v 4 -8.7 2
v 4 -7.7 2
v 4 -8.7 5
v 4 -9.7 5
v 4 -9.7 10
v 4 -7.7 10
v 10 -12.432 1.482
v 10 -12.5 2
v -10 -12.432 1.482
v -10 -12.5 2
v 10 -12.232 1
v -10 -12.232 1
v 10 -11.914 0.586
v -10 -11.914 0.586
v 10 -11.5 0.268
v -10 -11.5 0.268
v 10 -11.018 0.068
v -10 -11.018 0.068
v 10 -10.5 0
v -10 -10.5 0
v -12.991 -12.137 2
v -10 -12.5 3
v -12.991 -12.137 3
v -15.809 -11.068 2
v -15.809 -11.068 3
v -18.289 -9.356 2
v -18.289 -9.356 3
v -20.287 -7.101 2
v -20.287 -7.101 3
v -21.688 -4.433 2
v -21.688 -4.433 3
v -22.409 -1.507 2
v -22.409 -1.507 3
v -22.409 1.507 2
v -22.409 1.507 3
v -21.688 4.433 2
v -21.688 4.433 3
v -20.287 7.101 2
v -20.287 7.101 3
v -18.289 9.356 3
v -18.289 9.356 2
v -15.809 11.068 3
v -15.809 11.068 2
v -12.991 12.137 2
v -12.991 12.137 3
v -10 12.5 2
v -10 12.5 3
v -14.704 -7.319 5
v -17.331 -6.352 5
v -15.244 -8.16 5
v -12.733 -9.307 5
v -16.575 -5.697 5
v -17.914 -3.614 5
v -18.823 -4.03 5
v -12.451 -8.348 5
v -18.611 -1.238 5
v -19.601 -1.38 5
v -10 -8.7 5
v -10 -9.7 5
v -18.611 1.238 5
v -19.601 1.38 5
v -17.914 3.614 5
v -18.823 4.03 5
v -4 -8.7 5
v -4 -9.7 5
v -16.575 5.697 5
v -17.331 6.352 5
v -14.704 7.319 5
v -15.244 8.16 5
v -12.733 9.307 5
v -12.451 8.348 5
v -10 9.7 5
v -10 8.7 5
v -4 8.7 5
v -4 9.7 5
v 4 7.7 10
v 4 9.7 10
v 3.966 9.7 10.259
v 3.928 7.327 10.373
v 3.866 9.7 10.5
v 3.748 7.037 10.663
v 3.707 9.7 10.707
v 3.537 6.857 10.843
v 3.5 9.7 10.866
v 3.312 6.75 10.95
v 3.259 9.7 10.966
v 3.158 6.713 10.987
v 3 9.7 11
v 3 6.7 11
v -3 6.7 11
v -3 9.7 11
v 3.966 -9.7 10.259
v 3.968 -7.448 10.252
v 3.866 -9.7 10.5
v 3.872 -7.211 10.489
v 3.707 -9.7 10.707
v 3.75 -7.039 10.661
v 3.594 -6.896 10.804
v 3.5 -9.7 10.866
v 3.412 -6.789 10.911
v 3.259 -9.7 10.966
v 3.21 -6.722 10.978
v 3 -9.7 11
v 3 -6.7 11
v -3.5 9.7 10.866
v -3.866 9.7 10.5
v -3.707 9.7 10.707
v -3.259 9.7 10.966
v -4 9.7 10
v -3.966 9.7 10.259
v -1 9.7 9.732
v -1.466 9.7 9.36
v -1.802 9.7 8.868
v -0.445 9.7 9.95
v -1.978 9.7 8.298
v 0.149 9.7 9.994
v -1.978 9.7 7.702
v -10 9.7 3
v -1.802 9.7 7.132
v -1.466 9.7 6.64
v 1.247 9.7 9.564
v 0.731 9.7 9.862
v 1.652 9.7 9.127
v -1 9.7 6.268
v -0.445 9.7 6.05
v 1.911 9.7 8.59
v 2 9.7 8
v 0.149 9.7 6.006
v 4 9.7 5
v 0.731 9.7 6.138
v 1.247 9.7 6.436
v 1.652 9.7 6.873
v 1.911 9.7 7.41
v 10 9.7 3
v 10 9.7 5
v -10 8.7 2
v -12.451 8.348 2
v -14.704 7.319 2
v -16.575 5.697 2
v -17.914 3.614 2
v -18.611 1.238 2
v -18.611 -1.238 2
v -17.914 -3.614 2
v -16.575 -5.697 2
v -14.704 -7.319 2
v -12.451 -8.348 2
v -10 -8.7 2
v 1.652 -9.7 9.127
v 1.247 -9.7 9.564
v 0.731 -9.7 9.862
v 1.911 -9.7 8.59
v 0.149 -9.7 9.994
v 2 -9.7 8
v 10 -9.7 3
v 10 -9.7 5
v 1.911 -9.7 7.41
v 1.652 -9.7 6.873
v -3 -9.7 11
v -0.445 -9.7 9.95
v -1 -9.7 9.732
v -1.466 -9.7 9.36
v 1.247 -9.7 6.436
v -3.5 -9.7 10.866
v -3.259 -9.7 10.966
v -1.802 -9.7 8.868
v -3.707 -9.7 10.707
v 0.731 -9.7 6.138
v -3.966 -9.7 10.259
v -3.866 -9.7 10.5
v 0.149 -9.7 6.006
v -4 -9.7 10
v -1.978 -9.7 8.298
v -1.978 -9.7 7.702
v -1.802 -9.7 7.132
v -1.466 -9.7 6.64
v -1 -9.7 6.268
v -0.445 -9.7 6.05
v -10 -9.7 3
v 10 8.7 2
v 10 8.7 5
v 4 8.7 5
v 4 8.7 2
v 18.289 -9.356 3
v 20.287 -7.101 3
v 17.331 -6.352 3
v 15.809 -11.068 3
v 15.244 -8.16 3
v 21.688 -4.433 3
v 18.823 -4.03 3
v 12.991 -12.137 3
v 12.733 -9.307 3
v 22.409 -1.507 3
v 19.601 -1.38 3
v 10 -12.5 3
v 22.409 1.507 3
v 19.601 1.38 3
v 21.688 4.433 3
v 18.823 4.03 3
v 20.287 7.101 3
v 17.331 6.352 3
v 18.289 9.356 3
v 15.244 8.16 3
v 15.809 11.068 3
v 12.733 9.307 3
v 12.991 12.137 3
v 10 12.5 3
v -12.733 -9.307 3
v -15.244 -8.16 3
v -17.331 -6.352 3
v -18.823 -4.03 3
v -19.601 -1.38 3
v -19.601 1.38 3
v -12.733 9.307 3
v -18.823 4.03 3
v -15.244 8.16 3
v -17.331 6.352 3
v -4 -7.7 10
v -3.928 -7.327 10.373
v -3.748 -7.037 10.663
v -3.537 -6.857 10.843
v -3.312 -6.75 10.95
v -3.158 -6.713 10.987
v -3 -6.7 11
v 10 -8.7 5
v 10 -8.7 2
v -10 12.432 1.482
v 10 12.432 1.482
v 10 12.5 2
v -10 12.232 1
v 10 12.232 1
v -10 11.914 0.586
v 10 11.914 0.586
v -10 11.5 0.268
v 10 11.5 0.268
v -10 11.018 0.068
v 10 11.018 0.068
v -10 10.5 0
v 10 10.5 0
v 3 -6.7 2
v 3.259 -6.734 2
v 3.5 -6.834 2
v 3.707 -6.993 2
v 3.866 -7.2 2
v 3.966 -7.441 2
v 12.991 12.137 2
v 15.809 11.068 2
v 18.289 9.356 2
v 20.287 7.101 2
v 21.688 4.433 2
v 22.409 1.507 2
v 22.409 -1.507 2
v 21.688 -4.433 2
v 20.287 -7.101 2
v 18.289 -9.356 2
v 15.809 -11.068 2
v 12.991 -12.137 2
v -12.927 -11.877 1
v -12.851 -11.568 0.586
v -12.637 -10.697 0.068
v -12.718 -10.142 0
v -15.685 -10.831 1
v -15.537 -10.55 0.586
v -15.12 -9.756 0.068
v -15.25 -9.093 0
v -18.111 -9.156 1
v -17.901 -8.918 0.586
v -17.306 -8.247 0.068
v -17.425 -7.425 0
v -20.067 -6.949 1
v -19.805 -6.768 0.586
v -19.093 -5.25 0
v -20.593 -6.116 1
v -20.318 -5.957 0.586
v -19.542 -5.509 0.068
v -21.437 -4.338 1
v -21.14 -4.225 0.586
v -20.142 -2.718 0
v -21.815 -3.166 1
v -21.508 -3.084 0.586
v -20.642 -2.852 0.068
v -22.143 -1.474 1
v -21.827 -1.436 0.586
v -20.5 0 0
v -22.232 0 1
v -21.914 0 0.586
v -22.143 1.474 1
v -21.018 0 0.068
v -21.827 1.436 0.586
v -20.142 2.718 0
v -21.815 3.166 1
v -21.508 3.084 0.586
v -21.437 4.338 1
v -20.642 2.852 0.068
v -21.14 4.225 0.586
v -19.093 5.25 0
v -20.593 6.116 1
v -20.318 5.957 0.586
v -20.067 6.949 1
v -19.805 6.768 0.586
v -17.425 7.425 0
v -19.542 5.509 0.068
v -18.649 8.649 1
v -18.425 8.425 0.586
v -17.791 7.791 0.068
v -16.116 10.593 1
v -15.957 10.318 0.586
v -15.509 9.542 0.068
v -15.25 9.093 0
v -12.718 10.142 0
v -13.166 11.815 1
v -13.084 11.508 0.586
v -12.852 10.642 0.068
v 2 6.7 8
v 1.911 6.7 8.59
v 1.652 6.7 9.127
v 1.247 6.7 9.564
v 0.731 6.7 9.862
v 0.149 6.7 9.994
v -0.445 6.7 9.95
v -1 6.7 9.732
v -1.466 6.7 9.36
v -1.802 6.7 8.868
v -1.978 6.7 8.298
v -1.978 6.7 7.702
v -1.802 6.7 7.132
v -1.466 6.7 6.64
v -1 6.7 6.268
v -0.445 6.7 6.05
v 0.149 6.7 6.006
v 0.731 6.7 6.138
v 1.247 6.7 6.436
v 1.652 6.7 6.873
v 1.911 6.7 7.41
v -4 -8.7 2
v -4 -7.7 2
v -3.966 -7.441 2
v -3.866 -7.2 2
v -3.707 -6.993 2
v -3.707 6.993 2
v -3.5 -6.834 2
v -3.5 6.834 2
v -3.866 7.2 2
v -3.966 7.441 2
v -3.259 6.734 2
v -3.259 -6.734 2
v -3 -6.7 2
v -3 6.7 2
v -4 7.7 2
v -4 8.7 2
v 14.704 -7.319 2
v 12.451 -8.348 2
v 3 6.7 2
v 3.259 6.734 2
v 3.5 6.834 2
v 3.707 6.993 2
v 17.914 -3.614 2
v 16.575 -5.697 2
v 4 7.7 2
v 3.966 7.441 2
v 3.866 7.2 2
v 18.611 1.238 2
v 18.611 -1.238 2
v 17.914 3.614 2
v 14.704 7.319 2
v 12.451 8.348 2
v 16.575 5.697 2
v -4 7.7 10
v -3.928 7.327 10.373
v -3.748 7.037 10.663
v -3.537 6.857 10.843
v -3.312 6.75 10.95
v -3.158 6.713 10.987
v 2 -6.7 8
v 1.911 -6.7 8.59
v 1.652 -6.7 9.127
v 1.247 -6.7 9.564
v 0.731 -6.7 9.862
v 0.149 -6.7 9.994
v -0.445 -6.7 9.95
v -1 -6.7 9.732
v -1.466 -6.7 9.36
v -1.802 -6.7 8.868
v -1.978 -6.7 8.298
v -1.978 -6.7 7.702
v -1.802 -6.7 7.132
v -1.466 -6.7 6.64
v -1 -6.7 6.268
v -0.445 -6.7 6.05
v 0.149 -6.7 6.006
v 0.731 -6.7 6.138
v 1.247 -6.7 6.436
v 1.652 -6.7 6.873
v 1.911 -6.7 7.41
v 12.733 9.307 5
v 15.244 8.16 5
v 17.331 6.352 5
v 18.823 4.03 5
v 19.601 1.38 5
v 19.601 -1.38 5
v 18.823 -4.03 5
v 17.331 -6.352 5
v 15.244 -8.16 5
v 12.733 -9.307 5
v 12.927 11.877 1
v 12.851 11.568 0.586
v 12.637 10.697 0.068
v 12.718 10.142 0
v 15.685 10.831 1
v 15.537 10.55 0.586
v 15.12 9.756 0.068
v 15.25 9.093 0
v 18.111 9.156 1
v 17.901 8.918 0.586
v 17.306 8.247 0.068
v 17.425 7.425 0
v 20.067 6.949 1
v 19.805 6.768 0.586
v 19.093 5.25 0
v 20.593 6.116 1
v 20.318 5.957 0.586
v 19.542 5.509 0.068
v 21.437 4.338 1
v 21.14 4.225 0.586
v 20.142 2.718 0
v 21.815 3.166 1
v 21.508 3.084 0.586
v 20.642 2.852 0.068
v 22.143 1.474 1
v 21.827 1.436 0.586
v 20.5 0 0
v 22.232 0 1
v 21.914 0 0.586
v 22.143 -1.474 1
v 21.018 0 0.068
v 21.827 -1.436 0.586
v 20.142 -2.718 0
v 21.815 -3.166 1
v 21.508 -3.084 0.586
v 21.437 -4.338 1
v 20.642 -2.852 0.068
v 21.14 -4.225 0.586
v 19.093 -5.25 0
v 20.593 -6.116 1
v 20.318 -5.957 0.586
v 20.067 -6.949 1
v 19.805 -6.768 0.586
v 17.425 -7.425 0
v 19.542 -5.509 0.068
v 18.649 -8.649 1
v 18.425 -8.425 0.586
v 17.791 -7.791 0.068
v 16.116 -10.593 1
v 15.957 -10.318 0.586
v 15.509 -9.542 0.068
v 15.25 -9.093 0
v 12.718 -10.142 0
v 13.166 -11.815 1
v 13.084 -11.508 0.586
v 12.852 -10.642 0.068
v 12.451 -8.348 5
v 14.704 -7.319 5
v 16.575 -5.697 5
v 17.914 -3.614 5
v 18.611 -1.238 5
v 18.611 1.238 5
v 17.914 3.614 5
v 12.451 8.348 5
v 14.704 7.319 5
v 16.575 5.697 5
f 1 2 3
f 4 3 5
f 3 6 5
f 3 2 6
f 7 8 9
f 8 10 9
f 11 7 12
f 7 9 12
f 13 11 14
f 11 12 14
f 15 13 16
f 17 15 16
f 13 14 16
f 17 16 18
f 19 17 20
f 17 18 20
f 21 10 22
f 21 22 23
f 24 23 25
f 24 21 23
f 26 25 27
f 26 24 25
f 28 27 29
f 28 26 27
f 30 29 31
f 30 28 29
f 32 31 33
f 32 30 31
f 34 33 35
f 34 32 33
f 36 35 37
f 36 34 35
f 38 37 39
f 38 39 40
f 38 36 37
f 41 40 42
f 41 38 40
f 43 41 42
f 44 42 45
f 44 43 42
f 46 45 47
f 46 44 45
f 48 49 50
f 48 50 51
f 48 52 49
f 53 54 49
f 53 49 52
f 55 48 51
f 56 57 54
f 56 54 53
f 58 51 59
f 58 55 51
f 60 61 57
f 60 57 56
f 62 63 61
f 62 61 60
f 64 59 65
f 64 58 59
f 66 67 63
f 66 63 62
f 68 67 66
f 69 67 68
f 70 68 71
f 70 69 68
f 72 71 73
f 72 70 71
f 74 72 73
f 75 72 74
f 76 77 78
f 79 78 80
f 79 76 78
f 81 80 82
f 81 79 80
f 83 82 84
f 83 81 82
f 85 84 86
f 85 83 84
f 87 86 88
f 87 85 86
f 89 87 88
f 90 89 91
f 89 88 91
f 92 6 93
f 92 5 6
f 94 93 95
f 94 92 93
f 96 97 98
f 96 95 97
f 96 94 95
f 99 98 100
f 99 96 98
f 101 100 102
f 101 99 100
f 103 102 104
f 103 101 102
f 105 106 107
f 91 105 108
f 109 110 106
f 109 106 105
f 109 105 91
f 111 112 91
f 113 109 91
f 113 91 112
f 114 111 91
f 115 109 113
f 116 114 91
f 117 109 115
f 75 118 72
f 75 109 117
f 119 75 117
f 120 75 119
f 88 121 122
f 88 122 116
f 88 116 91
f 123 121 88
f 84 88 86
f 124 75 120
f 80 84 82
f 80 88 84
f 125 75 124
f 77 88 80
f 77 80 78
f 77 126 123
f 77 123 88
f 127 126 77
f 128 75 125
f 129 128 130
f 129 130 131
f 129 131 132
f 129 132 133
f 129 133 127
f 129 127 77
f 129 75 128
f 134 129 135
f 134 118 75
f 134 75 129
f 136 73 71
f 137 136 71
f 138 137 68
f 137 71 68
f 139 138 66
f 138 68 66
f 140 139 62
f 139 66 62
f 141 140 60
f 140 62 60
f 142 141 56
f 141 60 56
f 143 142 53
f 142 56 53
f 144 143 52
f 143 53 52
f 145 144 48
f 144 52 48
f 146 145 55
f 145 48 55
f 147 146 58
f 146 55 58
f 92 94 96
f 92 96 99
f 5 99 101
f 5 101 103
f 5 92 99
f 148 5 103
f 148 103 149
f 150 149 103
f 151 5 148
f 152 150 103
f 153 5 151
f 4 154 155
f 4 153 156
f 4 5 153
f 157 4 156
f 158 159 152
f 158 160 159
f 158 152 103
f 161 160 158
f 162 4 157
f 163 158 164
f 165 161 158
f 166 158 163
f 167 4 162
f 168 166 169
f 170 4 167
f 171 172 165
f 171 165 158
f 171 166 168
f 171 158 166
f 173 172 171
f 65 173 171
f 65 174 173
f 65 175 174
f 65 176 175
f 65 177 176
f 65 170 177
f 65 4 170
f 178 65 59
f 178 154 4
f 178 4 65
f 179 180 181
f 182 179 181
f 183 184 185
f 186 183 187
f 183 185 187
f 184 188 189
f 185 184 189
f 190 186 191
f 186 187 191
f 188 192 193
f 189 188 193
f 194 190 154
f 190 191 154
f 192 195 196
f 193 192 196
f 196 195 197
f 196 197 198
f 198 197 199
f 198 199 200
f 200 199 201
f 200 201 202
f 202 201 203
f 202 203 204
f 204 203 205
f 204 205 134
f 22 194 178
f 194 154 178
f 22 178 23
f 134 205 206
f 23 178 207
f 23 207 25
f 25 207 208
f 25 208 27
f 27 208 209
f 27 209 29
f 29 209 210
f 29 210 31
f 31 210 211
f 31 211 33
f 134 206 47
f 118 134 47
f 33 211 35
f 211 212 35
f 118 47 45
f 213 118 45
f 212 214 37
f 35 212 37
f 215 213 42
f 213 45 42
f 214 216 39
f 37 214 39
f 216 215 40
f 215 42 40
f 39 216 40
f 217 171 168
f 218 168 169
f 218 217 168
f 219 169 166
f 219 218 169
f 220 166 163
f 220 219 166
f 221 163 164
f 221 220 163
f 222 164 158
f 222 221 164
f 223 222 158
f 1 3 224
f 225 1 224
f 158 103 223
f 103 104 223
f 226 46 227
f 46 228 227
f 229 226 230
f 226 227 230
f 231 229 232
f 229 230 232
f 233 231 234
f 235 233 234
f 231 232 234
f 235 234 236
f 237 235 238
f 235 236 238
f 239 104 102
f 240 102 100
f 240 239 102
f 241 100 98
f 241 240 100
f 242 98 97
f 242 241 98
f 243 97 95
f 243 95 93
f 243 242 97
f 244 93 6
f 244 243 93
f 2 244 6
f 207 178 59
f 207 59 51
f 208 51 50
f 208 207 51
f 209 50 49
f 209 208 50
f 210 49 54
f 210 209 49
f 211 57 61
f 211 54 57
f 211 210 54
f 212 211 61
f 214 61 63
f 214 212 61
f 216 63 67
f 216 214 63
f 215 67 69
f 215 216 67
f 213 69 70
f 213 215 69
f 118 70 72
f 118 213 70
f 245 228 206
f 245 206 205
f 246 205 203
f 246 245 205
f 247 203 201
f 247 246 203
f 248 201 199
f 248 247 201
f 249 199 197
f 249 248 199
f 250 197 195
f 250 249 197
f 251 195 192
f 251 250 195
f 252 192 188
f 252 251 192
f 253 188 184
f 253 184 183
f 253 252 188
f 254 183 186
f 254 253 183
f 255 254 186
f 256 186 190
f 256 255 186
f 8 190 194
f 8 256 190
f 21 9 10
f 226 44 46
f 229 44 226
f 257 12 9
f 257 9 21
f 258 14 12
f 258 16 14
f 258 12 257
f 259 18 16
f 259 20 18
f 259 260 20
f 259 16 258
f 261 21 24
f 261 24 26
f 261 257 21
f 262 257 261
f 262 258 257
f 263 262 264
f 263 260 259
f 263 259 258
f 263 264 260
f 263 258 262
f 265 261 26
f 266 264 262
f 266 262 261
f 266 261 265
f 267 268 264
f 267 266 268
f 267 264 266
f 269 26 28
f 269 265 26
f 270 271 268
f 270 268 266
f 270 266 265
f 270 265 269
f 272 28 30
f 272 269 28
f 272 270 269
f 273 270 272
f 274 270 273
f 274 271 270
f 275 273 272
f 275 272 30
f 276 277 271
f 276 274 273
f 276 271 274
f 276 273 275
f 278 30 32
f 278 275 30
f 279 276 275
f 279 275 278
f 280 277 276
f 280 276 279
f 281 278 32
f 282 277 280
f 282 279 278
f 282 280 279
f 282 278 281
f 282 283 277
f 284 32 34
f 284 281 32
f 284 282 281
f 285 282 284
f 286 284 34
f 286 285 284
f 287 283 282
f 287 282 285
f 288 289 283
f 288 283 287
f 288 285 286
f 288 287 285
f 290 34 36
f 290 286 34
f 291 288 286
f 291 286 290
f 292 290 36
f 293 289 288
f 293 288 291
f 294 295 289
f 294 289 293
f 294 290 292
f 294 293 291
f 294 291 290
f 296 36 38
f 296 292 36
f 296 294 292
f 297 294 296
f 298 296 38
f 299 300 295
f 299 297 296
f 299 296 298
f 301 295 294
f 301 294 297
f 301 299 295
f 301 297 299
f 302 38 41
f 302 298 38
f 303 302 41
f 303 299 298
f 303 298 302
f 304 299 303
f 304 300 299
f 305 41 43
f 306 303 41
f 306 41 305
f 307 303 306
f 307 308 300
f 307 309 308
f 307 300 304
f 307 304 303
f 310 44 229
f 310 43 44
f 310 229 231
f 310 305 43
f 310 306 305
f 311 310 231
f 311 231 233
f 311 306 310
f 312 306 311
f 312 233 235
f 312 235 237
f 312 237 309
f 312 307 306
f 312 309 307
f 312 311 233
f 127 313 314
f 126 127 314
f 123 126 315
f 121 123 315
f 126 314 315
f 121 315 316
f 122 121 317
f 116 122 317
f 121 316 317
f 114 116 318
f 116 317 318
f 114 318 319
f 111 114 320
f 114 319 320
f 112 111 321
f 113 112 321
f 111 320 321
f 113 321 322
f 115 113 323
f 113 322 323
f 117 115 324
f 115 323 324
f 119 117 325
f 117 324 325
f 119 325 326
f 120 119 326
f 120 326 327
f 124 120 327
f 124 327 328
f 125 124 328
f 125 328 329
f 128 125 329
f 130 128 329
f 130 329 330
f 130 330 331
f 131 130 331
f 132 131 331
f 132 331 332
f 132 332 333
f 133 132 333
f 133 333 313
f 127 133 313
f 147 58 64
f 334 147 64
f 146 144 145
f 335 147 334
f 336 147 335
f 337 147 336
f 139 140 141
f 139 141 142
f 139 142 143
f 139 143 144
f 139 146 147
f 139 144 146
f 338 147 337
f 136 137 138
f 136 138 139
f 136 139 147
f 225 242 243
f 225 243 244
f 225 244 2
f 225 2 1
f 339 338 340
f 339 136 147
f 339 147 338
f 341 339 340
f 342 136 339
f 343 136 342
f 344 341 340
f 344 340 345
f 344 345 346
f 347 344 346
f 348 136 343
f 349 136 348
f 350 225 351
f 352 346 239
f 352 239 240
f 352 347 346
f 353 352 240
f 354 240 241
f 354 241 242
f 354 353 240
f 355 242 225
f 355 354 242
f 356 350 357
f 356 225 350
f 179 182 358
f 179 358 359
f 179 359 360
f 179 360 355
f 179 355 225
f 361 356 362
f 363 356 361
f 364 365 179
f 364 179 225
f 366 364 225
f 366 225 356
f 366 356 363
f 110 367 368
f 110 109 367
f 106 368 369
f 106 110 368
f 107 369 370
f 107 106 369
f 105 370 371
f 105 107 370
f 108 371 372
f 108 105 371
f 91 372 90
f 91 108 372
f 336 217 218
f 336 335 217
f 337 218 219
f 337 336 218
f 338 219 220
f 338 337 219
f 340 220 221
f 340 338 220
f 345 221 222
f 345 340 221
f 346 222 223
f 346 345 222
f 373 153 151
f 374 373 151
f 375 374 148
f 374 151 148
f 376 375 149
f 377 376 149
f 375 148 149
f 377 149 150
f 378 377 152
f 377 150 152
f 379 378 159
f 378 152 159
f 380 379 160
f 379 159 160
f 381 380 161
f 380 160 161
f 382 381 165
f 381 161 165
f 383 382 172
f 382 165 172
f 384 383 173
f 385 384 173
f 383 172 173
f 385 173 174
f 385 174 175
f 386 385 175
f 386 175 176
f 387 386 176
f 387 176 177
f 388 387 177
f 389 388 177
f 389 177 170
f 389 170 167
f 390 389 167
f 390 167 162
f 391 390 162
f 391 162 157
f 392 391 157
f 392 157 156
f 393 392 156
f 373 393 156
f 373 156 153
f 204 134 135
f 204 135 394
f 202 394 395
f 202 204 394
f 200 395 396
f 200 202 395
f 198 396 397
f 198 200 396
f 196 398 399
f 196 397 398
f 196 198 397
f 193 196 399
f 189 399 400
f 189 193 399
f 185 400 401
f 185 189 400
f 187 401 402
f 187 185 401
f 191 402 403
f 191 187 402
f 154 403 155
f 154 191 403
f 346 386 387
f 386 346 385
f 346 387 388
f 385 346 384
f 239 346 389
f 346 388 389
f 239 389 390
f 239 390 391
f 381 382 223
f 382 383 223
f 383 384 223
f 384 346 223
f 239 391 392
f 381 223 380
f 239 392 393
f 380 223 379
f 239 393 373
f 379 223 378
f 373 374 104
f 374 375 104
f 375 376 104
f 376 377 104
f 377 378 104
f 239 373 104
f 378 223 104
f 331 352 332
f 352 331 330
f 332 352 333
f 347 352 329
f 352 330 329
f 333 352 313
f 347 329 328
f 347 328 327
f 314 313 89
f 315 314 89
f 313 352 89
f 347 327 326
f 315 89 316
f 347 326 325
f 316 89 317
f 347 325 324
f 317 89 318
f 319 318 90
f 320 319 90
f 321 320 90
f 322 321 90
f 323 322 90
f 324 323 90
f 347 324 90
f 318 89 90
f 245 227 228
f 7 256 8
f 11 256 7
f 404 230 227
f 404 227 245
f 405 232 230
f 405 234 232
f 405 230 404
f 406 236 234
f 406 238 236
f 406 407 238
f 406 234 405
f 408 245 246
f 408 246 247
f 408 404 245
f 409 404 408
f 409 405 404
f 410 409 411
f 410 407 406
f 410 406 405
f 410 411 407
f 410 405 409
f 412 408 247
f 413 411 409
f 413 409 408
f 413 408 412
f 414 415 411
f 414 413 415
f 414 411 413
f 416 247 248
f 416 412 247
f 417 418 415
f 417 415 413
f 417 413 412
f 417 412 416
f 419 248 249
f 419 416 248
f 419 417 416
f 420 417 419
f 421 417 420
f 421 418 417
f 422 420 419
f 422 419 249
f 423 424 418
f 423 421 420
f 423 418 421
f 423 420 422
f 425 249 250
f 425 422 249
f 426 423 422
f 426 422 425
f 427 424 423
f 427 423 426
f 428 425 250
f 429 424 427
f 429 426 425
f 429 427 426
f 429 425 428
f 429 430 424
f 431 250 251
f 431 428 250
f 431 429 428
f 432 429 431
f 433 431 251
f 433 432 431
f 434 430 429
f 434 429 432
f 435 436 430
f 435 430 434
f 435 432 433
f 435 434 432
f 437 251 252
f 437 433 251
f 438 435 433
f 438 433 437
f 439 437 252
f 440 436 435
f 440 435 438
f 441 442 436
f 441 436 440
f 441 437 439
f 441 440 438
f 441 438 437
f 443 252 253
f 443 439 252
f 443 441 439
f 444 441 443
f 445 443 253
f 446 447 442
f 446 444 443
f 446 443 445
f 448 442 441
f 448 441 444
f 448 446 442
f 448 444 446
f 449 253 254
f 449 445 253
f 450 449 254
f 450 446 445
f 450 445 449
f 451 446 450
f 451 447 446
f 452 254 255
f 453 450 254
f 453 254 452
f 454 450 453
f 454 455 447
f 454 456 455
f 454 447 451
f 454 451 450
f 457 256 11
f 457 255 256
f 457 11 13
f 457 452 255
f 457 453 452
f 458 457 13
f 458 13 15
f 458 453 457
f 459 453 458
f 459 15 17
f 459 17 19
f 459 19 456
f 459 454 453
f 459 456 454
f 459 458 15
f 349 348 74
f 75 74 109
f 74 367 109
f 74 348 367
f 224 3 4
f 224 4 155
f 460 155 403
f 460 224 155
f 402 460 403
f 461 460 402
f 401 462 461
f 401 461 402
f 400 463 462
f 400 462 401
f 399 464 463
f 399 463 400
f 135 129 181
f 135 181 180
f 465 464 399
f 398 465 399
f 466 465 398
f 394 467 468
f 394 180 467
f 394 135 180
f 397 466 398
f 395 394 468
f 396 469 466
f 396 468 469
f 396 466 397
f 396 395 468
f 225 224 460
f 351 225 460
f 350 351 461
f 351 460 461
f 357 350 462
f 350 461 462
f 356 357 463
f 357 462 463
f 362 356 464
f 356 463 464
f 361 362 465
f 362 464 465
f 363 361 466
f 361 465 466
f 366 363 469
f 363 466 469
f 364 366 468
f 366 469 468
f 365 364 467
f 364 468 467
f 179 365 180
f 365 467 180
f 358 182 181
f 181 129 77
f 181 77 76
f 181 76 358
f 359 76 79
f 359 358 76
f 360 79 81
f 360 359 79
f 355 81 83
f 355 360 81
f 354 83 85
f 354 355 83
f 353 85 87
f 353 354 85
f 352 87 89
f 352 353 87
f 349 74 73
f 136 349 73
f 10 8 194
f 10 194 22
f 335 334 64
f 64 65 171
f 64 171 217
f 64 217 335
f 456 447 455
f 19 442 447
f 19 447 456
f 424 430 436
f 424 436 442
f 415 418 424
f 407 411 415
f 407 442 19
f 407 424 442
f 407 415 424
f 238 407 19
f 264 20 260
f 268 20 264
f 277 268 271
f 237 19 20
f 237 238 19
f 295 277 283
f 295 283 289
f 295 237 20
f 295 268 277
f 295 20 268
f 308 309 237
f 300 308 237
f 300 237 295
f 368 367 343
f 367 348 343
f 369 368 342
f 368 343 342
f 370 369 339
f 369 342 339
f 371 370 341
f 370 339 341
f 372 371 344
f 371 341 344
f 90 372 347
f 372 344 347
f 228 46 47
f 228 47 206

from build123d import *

# Parameters (mm, degrees)
RESSALTO_EXTRUS_O1_DEPTH = 3
RESSALTO_EXTRUS_O2_DEPTH = 11
CORTE_EXTRUS_O1_DEPTH    = 6
ESBO_O3_R                = 2
CORTE_EXTRUS_O2_DEPTH    = 23.2
FILETE1_R                = 1
FILETE2_R                = 2
CORTE_EXTRUS_O3_DEPTH    = 3


with BuildPart() as part:
    # Esboço1 → Ressalto-extrusão1 (new body)
    with BuildSketch(Plane.XY):
        with BuildLine():
            Line((-10, 12.5), (10, 12.5))
            ThreePointArc((10, 12.5), (22.5, 0), (10, -12.5))
            Line((10, -12.5), (-10, -12.5))
            ThreePointArc((-10, -12.5), (-22.5, 0), (-10, 12.5))
        make_face()
        with BuildLine():
            Line((-10, 9.7), (10, 9.7))
            ThreePointArc((10, 9.7), (19.7, 0), (10, -9.7))
            Line((10, -9.7), (-10, -9.7))
            ThreePointArc((-10, -9.7), (-19.7, 0), (-10, 9.7))
        make_face(mode=Mode.SUBTRACT)
    extrude(amount=RESSALTO_EXTRUS_O1_DEPTH)

    # Esboço1<2> → Ressalto-extrusão2 (add)
    with BuildSketch(Plane.XY):
        with BuildLine():
            Line((-10, 9.7), (10, 9.7))
            ThreePointArc((10, 9.7), (19.7, 0), (10, -9.7))
            Line((10, -9.7), (-10, -9.7))
            ThreePointArc((-10, -9.7), (-19.7, 0), (-10, 9.7))
        make_face()
    extrude(amount=RESSALTO_EXTRUS_O2_DEPTH)

    # Esboço2 → Corte-extrusão1 (cut)
    with BuildSketch(Plane.XY.offset(11)):
        with BuildLine():
            Line((-10, -9.7), (-4, -9.7))
            Line((-4, -9.7), (-4, -6.7))
            Line((-4, -6.7), (4, -6.7))
            Line((4, -6.7), (4, -9.7))
            Line((4, -9.7), (10, -9.7))
            ThreePointArc((10, -9.7), (19.7, 0), (10, 9.7))
            Line((10, 9.7), (4, 9.7))
            Line((4, 9.7), (4, 6.7))
            Line((4, 6.7), (-4, 6.7))
            Line((-4, 6.7), (-4, 9.7))
            Line((-4, 9.7), (-10, 9.7))
            ThreePointArc((-10, 9.7), (-19.7, 0), (-10, -9.7))
        make_face()
    extrude(amount=-CORTE_EXTRUS_O1_DEPTH, mode=Mode.SUBTRACT)

    # Esboço3 → Corte-extrusão2 (cut, through all)
    with BuildSketch(Plane.XZ.offset(9.7)):
        with Locations((0, 8)):
            Circle(ESBO_O3_R)
    extrude(amount=-CORTE_EXTRUS_O2_DEPTH, mode=Mode.SUBTRACT)

    # Filete1
    filete1_edges = [part.edges().sort_by_distance(p)[0] for p in [
        (-4, 6.7, 8),
        (4, 6.7, 8),
        (4, -6.7, 8),
        (-4, -6.7, 8),
        (-4, -8.2, 11),
        (4, -8.2, 11),
        (4, 8.2, 11),
        (-4, 8.2, 11),
    ]]
    fillet(filete1_edges, radius=FILETE1_R)

    # Filete2
    filete2_edges = [part.edges().sort_by_distance(p)[0] for p in [
        (0, 12.5, 0),
        (22.5, 0, 0),
        (0, -12.5, 0),
        (-22.5, 0, 0),
    ]]
    fillet(filete2_edges, radius=FILETE2_R)

    # Esboço4 → Corte-extrusão3 (cut)
    with BuildSketch(Plane.XY.offset(5)):
        with BuildLine():
            Line((-10, -8.7), (-4, -8.7))
            Line((-4, -8.7), (-4, -7.7))
            ThreePointArc((-4, -7.7), (-3.707106781, -6.992893219), (-3, -6.7))
            Line((-3, -6.7), (3, -6.7))
            ThreePointArc((3, -6.7), (3.707106781, -6.992893219), (4, -7.7))
            Line((4, -7.7), (4, -8.7))
            Line((4, -8.7), (10, -8.7))
            ThreePointArc((10, -8.7), (18.7, 0), (10, 8.7))
            Line((10, 8.7), (4, 8.7))
            Line((4, 8.7), (4, 7.7))
            ThreePointArc((4, 7.7), (3.707106781, 6.992893219), (3, 6.7))
            Line((3, 6.7), (-3, 6.7))
            ThreePointArc((-3, 6.7), (-3.707106781, 6.992893219), (-4, 7.7))
            Line((-4, 7.7), (-4, 8.7))
            Line((-4, 8.7), (-10, 8.7))
            ThreePointArc((-10, 8.7), (-18.7, 0), (-10, -8.7))
        make_face()
    extrude(amount=-CORTE_EXTRUS_O3_DEPTH, mode=Mode.SUBTRACT)


solid = part.part
